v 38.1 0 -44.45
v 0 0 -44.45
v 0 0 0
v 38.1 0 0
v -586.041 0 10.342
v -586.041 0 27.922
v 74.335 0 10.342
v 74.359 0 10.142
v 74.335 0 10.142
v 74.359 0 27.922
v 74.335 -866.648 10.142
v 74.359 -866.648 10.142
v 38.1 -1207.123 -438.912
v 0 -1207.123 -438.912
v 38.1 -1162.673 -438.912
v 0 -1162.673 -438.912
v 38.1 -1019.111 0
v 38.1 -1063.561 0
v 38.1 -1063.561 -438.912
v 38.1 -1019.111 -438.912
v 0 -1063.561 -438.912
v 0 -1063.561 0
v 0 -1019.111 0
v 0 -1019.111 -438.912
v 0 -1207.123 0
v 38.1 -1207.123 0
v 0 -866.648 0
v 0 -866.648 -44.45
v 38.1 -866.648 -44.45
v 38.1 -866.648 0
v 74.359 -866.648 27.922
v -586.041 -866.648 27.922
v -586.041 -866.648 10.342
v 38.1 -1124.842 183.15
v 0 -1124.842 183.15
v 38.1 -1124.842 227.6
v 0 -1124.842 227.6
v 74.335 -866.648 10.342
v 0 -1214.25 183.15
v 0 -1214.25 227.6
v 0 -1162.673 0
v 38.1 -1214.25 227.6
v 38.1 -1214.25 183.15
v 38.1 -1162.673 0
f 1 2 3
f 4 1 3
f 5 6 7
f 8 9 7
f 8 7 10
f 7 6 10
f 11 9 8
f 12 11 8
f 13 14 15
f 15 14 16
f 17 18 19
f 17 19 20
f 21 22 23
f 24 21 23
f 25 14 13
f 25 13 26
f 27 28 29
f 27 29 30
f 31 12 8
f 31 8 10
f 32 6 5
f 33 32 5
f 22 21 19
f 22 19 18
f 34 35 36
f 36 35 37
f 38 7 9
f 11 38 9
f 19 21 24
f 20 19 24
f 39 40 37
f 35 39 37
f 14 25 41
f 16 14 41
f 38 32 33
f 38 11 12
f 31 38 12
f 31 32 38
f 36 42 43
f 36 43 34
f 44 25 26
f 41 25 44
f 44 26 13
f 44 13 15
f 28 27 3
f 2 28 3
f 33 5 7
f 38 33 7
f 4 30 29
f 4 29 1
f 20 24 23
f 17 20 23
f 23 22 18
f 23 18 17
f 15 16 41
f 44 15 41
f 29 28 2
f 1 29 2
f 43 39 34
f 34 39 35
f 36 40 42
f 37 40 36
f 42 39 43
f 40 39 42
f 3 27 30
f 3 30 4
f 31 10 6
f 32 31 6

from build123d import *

# Parameters (mm, degrees)
F1_DEPTH  = 866.648
F3_W      = 866.648
F3_H      = 44.45
F4_DEPTH  = 38.1
F6_W      = 44.45
F6_H      = 438.912
F7_DEPTH  = 38.1
F5_W      = 44.45
F5_H      = 438.912
F8_DEPTH  = 38.1
F9_W      = 89.408
F9_H      = 44.45
F10_DEPTH = 38.1


with BuildPart() as f1:
    # F0 (on Front) → F1 (new body)
    with BuildSketch(Plane.XZ):
        Polygon((74.3594063997, 27.9216392498), (-586.0405936003, 27.9216392498), (-586.0405936003, 10.3416586194), (74.3354565084, 10.3416586194), (74.3354565084, 10.1416392498), (74.3594063997, 10.1416392498), align=None)
    extrude(amount=F1_DEPTH)


with BuildPart() as f1b:
    # F0 (on Front) → F1, piece 2 (new body)
    with BuildSketch(Plane.XZ):
        Polygon((-586.0405936003, 10.1416392498), (-586.0405936003, 10.3416586194), (-586.0645434916, 10.3416586194), (-586.0645434916, -3.8823413806), (74.3354565084, -3.8823413806), (74.3354565084, 10.1416392498), align=None)
    extrude(amount=F1_DEPTH)


with BuildPart() as f4:
    # F3 (on Right) → F4 (new body)
    with BuildSketch(Plane.YZ):
        with Locations((-433.324, -22.225)):
            Rectangle(F3_W, F3_H)
    extrude(amount=F4_DEPTH)


with BuildPart() as f7:
    # F6 (on Right) → F7 (new body)
    with BuildSketch(Plane.YZ):
        with Locations((-1184.8976058226, -219.456)):
            Rectangle(F6_W, F6_H)
    extrude(amount=F7_DEPTH)


with BuildPart() as f8:
    # F5 (on Right) → F8 (new body)
    with BuildSketch(Plane.YZ):
        with Locations((-1041.3358775639, -219.456)):
            Rectangle(F5_W, F5_H)
    extrude(amount=F8_DEPTH)


with BuildPart() as f10:
    # F9 (on Right) → F10 (new body)
    with BuildSketch(Plane.YZ):
        with Locations((-1169.5455312729, 205.3751596894)):
            Rectangle(F9_W, F9_H)
    extrude(amount=F10_DEPTH)


solid = Compound([f1.part, f4.part, f7.part, f8.part, f10.part])
